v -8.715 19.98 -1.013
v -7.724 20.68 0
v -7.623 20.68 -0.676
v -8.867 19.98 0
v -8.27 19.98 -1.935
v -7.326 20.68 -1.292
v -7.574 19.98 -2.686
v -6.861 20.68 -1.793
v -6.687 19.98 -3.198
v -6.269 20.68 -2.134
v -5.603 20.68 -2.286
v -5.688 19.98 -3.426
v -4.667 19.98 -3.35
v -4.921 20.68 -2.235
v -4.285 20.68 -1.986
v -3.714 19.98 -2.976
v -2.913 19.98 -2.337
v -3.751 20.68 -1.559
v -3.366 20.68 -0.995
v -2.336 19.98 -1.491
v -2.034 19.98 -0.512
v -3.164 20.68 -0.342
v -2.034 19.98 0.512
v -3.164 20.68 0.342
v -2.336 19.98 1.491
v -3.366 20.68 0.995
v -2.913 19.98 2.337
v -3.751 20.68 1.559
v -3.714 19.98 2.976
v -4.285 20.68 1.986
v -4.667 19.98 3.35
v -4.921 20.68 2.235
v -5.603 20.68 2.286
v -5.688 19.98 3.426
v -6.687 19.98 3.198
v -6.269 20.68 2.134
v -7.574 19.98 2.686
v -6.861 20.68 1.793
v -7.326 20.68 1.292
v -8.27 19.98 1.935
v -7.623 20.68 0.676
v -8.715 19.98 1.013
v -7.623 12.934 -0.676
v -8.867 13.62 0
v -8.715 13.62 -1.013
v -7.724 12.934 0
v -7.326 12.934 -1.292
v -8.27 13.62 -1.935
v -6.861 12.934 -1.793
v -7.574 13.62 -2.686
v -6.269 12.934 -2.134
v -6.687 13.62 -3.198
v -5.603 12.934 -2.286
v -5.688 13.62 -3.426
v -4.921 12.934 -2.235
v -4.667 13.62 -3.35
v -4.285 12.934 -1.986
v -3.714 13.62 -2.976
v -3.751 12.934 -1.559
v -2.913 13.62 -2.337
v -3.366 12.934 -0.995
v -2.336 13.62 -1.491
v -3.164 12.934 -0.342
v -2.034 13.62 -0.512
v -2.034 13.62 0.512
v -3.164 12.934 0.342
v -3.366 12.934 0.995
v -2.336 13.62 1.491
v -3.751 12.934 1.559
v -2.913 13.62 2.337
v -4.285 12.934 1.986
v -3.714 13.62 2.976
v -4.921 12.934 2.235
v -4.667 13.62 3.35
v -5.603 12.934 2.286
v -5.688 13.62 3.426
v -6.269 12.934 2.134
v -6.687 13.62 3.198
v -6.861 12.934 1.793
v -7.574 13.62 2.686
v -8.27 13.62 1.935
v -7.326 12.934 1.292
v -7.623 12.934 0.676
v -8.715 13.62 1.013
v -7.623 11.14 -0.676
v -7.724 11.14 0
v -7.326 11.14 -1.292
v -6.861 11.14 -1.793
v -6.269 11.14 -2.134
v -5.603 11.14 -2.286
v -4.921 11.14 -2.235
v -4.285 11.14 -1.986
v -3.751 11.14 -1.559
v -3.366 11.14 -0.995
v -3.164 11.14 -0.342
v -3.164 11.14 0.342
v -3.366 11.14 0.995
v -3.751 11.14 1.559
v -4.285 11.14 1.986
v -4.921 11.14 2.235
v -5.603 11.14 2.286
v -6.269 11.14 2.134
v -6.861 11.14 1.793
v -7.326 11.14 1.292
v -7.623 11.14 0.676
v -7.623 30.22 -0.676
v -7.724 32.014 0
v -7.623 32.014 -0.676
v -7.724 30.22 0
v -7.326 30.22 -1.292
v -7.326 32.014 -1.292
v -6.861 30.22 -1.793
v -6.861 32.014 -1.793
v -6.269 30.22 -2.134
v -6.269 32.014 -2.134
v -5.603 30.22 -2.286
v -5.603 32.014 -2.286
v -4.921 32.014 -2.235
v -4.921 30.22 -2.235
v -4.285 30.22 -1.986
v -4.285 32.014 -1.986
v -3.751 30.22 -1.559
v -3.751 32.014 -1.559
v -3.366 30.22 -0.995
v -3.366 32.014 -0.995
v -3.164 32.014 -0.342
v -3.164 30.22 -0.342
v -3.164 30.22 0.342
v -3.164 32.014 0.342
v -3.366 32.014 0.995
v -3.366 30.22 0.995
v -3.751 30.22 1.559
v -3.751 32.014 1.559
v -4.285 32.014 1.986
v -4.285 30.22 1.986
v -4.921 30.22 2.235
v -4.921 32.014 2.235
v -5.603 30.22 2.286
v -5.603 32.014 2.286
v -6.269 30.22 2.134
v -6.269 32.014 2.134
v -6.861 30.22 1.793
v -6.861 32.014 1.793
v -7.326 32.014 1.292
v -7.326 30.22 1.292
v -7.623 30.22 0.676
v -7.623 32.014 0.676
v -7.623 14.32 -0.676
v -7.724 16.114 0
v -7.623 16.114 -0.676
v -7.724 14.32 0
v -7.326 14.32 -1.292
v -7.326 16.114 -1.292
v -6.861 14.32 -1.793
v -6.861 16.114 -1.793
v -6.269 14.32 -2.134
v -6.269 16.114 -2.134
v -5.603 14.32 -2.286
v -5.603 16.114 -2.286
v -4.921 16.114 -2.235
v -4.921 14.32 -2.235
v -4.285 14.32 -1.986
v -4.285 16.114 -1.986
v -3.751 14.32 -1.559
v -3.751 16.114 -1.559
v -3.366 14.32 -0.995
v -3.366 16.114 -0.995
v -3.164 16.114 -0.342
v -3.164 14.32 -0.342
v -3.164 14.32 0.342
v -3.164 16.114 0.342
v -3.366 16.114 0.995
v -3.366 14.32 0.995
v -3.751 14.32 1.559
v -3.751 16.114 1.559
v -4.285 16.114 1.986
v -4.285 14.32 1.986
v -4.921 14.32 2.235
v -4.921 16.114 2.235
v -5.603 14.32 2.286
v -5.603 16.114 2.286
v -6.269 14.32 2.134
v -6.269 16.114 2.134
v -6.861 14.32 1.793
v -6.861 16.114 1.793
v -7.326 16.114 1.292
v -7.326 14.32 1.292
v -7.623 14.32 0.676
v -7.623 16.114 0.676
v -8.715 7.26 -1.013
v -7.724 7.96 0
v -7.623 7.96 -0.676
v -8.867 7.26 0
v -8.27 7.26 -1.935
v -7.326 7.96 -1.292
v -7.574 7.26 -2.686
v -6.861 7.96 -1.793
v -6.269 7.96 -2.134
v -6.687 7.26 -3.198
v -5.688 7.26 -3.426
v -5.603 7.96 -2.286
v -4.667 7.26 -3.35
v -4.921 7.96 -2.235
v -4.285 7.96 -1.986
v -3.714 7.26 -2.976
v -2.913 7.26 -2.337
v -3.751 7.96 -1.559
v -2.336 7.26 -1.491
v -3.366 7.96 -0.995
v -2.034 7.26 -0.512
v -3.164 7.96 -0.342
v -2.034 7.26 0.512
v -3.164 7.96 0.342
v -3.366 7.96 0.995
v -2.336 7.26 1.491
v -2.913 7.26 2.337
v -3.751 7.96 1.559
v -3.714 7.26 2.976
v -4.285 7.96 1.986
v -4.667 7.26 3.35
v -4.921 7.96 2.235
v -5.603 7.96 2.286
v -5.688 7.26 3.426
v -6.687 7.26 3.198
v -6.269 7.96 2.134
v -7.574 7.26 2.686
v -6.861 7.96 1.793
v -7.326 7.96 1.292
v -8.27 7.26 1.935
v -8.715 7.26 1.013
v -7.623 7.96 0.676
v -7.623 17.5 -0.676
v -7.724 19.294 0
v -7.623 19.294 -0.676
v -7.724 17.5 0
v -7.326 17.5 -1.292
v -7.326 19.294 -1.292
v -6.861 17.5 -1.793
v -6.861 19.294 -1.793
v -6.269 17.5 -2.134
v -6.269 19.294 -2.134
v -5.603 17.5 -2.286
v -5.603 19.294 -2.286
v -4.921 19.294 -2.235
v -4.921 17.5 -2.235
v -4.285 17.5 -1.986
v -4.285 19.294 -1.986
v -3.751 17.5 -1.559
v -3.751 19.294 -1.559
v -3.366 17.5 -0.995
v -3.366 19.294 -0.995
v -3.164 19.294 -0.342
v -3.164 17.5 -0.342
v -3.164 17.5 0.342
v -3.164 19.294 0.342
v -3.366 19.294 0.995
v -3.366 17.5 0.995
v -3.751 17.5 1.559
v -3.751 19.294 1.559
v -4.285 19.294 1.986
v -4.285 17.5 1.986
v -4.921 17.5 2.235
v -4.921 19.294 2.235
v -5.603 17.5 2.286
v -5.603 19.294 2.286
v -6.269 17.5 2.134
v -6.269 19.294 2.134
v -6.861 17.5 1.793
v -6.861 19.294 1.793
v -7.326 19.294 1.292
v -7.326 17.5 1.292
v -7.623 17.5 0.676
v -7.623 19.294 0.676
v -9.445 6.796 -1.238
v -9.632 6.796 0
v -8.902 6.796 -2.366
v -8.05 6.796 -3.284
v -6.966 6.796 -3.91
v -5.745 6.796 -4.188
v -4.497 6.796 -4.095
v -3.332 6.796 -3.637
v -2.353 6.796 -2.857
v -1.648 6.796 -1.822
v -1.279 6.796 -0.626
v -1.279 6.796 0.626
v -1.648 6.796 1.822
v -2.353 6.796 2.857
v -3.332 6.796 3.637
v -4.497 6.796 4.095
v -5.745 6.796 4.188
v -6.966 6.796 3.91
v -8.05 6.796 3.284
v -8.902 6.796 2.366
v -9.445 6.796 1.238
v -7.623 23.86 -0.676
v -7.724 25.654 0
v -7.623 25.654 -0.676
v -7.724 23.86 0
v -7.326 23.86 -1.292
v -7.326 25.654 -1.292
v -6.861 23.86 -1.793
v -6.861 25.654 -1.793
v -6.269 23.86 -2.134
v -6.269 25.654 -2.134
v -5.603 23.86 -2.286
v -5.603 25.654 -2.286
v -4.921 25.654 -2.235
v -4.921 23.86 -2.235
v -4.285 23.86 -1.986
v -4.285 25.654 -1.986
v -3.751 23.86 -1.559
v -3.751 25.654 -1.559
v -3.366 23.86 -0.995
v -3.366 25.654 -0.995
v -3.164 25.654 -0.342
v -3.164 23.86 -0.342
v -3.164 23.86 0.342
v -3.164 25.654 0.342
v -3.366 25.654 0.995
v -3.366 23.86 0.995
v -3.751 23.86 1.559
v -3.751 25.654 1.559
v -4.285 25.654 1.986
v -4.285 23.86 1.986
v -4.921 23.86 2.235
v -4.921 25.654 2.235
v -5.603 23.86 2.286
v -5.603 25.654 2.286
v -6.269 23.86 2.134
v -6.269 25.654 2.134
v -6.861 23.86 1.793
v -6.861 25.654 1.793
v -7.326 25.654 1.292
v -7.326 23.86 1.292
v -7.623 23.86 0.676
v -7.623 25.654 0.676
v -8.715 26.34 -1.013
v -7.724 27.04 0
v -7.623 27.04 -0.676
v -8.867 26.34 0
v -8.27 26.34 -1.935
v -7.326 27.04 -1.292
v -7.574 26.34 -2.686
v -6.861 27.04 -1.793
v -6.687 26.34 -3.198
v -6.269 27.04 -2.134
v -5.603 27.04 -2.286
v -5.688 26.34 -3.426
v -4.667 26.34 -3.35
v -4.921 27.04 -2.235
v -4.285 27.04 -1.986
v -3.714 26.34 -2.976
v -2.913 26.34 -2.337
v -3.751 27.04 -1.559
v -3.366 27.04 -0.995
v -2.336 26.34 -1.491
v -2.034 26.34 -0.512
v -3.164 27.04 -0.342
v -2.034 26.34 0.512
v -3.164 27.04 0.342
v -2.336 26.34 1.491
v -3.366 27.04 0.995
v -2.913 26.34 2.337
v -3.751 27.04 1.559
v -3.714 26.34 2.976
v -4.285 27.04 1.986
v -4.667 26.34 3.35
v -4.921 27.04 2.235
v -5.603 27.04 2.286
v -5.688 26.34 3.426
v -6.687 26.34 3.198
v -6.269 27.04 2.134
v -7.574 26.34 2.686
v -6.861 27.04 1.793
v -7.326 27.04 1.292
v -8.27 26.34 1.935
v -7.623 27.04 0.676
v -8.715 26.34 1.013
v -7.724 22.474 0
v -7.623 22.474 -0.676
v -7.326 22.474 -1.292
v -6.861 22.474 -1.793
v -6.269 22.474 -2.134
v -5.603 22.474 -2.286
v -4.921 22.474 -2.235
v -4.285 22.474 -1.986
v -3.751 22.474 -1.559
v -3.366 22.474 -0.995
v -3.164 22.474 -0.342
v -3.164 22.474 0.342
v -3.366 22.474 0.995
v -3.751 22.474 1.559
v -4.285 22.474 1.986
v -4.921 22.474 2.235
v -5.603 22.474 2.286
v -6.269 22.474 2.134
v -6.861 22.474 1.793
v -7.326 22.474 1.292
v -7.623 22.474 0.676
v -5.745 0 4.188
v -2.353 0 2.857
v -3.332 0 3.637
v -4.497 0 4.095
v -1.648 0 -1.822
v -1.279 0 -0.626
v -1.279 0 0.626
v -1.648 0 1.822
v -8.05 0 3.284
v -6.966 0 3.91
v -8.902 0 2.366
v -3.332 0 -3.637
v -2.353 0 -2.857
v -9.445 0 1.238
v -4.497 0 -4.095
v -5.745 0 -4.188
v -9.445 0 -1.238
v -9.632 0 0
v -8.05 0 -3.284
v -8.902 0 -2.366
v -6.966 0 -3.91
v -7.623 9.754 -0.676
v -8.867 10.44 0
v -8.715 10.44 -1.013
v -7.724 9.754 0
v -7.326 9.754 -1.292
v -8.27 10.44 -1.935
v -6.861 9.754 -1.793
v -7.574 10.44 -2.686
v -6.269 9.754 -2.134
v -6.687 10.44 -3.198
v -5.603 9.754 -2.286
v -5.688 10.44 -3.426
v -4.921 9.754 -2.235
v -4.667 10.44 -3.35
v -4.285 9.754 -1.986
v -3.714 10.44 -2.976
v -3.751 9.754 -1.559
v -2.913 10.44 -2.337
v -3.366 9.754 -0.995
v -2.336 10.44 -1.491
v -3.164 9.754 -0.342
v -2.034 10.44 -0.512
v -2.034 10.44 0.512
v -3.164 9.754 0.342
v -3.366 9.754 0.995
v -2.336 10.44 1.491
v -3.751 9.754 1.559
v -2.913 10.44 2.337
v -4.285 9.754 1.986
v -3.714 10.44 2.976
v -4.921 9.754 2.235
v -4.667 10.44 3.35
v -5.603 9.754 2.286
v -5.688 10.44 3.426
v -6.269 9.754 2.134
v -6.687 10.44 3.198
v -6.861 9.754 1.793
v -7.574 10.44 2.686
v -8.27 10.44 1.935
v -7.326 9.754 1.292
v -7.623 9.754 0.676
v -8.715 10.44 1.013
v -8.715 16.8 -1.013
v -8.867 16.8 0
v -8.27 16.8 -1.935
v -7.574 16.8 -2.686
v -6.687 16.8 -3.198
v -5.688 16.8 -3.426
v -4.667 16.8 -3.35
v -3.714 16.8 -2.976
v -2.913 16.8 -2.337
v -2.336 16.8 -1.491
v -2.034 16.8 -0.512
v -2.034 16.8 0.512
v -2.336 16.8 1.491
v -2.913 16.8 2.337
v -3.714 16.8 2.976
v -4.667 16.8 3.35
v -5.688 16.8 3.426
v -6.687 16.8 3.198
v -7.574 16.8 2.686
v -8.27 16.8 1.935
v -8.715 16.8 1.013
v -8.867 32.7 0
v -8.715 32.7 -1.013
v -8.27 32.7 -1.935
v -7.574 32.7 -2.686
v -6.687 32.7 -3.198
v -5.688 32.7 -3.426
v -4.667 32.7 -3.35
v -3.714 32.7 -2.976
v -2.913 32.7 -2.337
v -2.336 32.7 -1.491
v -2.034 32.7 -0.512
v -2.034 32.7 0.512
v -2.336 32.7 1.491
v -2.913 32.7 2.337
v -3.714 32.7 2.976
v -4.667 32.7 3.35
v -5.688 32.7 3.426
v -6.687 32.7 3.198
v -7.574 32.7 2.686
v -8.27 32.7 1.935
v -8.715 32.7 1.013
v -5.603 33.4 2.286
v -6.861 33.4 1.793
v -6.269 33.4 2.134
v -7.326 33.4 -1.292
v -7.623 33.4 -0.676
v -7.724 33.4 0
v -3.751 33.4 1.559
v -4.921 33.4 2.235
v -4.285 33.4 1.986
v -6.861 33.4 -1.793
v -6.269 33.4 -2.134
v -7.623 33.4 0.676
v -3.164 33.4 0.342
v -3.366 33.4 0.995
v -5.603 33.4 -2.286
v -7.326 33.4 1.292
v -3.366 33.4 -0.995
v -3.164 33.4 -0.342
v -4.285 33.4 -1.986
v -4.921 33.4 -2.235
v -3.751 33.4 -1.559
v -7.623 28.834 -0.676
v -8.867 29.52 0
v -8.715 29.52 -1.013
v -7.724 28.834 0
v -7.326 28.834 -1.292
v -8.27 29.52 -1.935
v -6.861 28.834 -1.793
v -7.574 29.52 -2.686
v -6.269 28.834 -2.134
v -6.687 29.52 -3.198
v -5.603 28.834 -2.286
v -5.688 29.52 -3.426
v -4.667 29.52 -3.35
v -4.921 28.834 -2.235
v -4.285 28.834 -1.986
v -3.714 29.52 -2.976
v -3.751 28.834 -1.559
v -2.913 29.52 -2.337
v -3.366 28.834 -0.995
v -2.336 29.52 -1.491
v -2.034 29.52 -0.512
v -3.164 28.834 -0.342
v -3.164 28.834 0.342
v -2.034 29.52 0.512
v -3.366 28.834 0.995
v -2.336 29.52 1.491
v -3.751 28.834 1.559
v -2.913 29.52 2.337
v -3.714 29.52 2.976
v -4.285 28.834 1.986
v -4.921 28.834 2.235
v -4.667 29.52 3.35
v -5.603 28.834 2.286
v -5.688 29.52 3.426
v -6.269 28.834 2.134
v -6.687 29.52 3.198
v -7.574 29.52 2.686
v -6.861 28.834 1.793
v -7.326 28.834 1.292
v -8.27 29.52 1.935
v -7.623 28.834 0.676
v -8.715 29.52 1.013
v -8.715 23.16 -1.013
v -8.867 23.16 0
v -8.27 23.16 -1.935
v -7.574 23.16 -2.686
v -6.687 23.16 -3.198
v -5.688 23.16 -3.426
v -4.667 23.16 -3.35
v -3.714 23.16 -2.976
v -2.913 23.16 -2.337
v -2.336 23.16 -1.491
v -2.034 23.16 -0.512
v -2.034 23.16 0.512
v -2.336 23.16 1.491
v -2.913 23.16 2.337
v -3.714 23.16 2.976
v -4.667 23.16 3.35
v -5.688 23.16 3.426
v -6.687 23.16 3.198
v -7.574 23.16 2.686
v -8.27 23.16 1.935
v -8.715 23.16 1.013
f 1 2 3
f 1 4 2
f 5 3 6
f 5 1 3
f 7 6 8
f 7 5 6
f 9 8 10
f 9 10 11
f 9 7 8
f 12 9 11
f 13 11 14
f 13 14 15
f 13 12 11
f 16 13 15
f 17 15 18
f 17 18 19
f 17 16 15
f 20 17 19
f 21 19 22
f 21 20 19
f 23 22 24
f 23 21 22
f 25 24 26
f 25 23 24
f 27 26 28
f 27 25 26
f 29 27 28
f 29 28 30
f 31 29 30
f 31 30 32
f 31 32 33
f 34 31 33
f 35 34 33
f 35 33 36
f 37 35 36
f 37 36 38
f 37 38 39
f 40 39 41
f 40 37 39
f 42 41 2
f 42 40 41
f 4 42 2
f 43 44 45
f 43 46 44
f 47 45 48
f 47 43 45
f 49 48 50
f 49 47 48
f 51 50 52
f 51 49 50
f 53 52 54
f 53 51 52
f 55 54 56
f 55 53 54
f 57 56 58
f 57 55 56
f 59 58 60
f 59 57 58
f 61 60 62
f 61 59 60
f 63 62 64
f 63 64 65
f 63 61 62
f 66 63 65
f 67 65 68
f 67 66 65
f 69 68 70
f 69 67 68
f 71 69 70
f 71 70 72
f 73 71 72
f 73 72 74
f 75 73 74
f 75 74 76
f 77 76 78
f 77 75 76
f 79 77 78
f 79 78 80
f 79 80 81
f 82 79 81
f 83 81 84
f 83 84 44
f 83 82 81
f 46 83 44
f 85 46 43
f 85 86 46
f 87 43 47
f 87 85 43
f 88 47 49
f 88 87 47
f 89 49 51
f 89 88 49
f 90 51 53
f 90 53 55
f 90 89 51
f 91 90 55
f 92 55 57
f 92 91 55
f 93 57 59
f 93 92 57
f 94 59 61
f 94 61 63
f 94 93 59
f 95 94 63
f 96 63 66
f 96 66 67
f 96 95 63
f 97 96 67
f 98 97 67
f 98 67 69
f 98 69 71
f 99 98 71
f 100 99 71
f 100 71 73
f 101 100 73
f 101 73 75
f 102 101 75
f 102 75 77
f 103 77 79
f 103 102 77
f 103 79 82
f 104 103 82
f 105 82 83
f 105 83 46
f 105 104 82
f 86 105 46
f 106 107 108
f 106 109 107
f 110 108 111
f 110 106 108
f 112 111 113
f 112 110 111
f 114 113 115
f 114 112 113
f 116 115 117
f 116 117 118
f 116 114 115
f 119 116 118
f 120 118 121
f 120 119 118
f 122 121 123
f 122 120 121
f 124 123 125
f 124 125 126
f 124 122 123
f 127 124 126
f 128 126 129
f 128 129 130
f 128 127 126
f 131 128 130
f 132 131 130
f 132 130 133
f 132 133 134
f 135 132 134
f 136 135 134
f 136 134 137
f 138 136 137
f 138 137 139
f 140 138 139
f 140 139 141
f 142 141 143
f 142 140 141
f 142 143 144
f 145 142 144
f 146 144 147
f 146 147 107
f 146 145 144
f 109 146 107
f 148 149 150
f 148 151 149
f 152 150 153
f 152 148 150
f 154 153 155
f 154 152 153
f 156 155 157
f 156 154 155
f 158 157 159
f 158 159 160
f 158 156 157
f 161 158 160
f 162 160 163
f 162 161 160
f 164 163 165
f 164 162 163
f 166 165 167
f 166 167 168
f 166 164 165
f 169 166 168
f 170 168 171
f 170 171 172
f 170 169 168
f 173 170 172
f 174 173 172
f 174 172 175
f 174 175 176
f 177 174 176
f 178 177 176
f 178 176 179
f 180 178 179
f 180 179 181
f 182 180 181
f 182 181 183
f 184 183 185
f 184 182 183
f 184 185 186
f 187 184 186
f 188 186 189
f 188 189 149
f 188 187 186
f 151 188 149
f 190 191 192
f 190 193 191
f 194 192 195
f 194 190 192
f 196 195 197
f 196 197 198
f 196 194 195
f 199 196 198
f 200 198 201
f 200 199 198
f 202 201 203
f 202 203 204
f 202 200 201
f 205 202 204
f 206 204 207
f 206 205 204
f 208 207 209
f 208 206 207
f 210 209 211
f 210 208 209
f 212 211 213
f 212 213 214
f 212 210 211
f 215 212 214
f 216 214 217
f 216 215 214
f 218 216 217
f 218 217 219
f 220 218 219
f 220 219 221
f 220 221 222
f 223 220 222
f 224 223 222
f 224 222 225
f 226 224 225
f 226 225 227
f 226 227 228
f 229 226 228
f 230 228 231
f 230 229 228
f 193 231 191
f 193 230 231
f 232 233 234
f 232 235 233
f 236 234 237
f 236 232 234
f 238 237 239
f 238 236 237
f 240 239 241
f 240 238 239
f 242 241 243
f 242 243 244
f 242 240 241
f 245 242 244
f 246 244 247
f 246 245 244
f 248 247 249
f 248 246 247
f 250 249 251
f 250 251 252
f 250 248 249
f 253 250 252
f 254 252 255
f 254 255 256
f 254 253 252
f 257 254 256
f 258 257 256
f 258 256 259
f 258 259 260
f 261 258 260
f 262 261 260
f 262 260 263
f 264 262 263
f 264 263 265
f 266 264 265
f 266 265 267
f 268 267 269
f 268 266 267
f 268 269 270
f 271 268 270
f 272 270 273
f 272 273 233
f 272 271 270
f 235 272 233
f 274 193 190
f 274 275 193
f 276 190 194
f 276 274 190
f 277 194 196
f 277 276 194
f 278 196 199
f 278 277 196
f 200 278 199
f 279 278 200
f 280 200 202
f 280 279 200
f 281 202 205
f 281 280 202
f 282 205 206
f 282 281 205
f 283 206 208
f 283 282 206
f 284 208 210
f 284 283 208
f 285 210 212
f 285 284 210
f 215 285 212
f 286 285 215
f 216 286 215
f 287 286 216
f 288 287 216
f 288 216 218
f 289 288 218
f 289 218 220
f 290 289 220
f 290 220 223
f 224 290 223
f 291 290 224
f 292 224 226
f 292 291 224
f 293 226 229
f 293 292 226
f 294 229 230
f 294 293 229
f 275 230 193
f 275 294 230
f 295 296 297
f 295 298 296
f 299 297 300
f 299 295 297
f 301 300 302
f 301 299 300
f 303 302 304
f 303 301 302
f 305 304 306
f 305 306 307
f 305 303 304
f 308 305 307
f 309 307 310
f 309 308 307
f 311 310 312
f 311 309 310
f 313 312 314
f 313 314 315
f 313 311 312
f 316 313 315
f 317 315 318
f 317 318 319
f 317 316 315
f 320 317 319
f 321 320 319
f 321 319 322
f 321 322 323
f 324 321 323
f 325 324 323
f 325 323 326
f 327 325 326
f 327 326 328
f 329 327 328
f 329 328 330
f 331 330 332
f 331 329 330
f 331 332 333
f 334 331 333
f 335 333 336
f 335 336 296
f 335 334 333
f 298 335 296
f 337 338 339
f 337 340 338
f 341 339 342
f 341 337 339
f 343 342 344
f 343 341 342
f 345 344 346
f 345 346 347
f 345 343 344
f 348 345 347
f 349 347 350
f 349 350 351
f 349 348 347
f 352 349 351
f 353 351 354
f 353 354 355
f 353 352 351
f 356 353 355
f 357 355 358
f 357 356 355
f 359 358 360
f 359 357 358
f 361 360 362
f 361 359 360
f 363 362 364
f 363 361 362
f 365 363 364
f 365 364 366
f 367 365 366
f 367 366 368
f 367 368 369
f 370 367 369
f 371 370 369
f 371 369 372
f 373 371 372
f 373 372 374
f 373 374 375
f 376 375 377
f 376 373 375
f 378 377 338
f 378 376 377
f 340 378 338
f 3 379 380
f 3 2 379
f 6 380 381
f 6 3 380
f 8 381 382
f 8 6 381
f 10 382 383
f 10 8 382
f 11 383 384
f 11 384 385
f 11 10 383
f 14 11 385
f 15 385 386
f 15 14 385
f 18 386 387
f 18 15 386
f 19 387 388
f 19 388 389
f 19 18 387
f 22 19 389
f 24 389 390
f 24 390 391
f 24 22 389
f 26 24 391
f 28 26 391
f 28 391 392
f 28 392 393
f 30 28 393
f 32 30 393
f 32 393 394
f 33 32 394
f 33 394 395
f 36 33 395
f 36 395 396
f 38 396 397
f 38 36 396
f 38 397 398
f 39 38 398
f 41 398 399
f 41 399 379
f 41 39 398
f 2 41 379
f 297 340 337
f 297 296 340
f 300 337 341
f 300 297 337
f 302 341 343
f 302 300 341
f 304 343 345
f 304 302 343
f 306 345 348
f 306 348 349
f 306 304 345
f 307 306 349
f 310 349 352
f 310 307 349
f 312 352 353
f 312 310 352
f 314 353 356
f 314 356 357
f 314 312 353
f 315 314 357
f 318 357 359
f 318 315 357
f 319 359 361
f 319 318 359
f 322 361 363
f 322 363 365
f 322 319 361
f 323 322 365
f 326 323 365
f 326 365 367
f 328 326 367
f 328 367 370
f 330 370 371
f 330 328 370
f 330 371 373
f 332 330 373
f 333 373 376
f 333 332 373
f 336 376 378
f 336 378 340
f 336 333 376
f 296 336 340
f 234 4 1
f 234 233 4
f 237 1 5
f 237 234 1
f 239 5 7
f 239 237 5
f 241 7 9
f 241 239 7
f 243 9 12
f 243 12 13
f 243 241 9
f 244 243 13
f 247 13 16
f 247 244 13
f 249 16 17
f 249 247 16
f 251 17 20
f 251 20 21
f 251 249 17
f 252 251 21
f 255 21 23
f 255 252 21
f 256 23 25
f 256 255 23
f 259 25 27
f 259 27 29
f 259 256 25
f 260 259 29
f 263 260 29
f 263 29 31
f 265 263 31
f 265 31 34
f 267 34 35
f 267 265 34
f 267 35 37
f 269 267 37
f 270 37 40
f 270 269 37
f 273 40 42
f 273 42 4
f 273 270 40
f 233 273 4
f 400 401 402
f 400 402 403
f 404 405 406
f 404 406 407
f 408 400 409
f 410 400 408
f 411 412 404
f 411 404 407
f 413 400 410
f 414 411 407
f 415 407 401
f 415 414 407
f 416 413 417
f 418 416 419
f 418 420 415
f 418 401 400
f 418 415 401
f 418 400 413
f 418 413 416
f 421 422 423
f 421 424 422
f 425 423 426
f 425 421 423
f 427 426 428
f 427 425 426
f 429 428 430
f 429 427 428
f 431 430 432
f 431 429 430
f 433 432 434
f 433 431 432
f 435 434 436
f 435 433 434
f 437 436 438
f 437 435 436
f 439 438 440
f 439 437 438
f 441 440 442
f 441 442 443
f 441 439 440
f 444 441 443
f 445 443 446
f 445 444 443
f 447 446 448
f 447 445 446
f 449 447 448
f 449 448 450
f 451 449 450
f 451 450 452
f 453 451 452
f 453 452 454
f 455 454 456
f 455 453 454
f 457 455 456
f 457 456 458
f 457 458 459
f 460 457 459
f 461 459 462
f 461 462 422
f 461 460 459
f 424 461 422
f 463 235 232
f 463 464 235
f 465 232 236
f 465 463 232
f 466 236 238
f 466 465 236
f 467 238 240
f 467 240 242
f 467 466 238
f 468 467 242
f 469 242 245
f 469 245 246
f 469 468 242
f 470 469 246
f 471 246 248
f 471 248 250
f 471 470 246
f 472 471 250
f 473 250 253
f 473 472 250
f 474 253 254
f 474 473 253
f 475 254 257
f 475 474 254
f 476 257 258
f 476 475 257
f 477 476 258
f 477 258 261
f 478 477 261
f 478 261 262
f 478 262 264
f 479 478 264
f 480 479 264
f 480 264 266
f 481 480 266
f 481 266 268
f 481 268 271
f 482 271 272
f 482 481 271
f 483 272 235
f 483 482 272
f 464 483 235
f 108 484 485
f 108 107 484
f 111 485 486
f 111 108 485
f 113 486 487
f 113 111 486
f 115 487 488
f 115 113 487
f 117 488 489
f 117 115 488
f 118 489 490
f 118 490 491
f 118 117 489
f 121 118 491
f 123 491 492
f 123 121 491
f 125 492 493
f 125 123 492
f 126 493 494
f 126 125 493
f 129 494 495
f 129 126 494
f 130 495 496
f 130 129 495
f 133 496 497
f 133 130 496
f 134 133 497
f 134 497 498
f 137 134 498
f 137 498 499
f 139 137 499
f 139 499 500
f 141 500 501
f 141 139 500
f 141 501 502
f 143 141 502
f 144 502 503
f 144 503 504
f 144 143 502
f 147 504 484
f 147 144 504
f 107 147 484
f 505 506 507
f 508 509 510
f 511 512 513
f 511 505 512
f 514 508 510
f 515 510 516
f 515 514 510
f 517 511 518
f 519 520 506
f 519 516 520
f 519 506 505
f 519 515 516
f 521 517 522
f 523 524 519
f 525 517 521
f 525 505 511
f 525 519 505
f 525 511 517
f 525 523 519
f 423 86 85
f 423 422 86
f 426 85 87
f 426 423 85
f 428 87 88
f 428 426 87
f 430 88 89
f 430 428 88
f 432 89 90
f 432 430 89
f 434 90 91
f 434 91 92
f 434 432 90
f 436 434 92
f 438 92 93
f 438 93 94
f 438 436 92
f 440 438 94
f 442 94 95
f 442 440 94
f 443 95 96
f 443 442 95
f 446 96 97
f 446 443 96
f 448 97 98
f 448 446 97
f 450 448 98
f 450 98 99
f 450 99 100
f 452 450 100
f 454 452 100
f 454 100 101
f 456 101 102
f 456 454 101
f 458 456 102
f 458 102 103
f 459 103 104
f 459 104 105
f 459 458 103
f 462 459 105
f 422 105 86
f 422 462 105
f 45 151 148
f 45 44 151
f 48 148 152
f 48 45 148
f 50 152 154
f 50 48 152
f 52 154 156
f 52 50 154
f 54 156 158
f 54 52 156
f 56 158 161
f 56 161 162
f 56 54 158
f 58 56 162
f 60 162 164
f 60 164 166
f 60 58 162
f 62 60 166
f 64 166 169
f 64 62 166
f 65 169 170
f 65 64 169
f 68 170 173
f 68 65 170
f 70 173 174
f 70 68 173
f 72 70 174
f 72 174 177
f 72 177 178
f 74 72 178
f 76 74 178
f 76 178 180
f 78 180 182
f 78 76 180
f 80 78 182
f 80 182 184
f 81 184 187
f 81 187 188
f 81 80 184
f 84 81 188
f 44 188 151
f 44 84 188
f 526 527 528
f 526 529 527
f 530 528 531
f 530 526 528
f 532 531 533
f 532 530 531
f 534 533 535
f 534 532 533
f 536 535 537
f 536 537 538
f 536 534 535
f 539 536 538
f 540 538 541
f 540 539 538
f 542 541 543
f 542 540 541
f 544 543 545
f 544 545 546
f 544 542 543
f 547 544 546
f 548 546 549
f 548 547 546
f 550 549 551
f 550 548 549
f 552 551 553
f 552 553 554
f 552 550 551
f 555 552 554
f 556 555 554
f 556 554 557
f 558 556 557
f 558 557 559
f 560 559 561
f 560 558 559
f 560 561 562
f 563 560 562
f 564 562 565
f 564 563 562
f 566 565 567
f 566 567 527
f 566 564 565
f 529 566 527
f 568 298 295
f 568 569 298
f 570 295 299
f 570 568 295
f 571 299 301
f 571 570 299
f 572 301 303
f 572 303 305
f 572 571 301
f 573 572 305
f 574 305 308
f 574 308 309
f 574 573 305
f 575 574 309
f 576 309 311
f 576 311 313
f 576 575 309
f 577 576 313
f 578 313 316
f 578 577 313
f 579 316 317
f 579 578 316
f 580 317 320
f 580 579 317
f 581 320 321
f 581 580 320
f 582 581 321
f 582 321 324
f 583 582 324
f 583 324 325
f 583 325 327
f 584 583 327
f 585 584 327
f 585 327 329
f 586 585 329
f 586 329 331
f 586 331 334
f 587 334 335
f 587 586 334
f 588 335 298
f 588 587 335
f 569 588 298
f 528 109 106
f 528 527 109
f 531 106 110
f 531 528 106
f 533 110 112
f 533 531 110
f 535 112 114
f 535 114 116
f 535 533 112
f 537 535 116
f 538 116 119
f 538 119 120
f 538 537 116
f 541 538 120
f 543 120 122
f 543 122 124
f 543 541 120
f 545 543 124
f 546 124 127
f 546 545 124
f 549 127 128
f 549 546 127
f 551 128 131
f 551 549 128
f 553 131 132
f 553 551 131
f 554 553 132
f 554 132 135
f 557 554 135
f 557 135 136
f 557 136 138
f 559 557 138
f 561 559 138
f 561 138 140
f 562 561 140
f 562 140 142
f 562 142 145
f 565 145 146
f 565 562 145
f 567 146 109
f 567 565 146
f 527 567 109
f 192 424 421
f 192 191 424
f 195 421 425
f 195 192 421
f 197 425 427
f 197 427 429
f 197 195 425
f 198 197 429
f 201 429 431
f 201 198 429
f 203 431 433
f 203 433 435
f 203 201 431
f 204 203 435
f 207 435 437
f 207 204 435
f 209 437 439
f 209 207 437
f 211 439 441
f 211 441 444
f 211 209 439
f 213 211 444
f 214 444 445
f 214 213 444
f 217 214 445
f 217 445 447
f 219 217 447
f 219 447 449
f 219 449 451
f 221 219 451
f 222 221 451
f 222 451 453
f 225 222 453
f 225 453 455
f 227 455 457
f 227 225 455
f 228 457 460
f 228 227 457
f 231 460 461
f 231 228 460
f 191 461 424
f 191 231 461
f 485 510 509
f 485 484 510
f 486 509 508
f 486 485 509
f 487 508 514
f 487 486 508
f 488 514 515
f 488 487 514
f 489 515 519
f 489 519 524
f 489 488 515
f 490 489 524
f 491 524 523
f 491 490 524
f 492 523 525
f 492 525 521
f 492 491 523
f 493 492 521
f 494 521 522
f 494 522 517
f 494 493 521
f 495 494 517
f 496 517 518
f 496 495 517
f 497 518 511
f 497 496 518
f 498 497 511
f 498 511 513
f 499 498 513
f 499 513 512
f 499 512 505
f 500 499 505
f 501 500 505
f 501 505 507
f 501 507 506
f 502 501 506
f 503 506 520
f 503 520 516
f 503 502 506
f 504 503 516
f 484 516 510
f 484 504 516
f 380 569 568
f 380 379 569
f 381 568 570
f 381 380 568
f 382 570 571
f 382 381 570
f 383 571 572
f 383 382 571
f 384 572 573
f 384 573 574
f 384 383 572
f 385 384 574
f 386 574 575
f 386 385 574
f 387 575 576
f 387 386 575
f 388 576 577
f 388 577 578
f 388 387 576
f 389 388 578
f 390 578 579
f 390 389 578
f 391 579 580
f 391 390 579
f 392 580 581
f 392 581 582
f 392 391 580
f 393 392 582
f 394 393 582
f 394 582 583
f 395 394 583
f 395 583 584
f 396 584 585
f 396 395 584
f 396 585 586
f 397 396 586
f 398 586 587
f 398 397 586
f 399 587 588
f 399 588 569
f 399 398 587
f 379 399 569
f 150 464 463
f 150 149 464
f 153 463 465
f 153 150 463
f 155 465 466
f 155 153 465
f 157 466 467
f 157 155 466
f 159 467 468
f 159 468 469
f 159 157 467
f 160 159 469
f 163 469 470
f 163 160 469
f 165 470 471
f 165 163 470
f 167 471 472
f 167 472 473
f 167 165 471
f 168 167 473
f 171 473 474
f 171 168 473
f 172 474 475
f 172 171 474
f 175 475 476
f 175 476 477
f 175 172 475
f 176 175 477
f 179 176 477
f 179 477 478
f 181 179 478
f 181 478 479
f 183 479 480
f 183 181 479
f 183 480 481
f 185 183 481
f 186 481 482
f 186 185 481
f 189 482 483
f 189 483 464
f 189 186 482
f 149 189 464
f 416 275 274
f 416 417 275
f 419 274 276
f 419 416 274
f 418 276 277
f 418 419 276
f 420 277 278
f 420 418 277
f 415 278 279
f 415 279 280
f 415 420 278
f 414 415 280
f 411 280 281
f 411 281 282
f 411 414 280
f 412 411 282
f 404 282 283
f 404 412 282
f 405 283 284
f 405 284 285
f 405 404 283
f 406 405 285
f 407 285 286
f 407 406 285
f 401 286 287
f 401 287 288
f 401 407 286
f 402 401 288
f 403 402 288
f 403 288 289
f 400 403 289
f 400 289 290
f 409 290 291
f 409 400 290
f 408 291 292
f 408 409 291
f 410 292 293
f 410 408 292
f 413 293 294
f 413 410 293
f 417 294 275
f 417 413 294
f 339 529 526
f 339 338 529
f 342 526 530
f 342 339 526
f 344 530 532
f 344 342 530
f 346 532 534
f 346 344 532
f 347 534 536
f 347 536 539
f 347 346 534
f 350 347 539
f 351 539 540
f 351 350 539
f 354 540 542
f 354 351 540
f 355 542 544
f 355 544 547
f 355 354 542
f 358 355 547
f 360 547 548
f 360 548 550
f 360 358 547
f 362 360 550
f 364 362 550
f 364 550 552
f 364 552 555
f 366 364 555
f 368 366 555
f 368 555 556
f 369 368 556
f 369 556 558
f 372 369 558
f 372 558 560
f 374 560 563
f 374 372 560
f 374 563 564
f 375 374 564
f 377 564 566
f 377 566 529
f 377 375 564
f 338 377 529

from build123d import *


with BuildPart() as part:
    # Sketch1 → Revolve2 (revolve)
    with BuildSketch(Plane.XY, mode=Mode.PRIVATE) as revolve2_sk:
        Polygon((-1.231630681, 0), (-5.431630681, 0), (-5.431630681, 33.4), (-3.138866015, 33.4), (-1.995791511, 32.7), (-3.138866015, 32.014155298), (-3.138866015, 30.22), (-1.995791511, 29.52), (-3.138866015, 28.834155298), (-3.138866015, 27.04), (-1.995791511, 26.34), (-3.138866015, 25.654155298), (-3.138866015, 23.86), (-1.995791511, 23.16), (-3.138866015, 22.474155298), (-3.138866015, 20.68), (-1.995791511, 19.98), (-3.138866015, 19.294155298), (-3.138866015, 17.5), (-1.995791511, 16.8), (-3.138866015, 16.114155298), (-3.138866015, 14.32), (-1.995791511, 13.62), (-3.138866015, 12.934155298), (-3.138866015, 11.14), (-1.995791511, 10.44), (-3.138866015, 9.754155298), (-3.138866015, 7.96), (-1.995791511, 7.26), (-1.231630681, 6.795995819), align=None)
    revolve(revolve2_sk.sketch.rotate(Axis((-5.431630681, 34.2, 0), (0, -1, 0)), 180), axis=Axis((-5.431630681, 34.2, 0), (0, -1, 0)))


solid = part.part
